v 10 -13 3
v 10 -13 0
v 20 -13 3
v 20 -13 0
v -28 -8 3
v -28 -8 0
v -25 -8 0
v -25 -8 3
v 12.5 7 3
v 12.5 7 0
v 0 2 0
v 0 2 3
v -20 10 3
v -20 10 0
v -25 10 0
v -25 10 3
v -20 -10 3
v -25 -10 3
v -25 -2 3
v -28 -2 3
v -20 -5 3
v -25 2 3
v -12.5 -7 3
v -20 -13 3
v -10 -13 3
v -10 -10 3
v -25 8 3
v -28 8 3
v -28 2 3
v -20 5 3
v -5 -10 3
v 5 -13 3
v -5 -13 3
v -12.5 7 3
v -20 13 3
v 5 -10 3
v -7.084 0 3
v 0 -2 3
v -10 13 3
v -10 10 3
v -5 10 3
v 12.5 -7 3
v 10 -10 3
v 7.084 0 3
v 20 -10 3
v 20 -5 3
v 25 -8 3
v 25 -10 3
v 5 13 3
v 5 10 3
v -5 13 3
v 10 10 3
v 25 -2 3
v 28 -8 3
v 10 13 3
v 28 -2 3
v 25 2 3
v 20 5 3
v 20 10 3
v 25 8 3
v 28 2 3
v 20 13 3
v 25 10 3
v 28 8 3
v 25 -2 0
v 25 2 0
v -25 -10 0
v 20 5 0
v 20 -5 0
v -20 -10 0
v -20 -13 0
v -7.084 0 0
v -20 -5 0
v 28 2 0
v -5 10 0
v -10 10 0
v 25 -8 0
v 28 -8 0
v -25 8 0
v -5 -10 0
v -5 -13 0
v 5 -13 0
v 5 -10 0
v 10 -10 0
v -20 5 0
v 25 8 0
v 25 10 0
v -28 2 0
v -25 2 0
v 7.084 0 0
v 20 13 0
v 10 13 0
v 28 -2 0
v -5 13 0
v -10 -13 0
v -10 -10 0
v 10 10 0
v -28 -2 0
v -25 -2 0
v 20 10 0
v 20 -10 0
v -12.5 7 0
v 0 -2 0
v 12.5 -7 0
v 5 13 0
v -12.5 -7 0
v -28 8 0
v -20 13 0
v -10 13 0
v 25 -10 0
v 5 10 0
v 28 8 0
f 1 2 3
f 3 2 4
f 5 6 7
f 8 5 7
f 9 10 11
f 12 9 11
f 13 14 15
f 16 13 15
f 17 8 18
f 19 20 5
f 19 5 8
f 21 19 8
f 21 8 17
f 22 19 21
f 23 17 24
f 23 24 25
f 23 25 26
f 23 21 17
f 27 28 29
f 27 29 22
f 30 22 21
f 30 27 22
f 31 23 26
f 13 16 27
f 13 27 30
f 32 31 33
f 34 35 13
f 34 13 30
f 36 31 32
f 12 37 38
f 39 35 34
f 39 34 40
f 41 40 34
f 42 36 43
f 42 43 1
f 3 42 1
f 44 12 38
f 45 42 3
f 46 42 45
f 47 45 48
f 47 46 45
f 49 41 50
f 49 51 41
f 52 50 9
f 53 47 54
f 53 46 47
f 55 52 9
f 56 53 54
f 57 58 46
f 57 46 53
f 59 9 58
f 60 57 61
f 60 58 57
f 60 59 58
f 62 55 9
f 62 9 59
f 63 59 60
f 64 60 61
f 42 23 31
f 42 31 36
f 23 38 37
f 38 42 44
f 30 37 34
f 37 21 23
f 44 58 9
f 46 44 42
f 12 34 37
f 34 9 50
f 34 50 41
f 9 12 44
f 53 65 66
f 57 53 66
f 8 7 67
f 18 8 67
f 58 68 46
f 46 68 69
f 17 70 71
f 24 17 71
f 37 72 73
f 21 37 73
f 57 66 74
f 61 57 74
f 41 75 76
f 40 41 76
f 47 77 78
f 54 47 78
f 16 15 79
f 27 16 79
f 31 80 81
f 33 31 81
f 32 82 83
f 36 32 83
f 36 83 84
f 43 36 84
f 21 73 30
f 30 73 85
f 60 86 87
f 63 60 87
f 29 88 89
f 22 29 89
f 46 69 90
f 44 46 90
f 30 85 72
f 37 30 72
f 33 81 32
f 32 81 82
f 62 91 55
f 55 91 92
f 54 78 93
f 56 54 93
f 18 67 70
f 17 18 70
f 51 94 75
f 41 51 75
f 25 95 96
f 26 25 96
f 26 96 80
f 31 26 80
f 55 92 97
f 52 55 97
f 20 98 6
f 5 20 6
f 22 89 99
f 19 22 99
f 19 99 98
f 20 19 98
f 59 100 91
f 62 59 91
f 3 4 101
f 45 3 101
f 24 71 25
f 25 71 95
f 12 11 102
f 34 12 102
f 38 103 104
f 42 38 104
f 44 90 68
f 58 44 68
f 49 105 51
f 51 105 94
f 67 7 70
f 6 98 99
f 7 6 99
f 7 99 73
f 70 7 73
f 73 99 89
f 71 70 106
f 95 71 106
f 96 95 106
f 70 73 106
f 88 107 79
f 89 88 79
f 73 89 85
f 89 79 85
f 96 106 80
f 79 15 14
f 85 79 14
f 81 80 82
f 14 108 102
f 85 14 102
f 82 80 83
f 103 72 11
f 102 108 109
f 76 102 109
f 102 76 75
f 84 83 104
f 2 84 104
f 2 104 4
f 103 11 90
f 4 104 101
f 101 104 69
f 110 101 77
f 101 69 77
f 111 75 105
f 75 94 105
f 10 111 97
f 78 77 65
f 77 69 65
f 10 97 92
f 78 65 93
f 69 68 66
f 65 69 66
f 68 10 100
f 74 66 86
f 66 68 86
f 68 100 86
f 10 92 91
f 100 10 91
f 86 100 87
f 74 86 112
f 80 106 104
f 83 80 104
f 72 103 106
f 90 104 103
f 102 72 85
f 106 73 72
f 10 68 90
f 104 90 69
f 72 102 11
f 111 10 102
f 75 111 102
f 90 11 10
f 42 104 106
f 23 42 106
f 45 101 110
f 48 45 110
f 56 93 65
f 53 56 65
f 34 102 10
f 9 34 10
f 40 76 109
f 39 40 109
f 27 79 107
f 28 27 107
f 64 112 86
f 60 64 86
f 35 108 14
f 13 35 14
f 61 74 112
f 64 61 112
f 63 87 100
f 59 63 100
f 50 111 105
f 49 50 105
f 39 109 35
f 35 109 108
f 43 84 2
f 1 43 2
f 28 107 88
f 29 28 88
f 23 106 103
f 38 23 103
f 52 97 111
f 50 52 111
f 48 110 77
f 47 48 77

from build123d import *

# Parameters (mm, degrees)
EXTRUDE_1_DEPTH = 3


with BuildPart() as part:
    # 草图1 → 凸台-拉伸1 (new body)
    with BuildSketch(Plane.XY):
        Polygon((-25, -10), (-20, -10), (-20, -13), (-10, -13), (-10, -10), (-5, -10), (-5, -13), (5, -13), (5, -10), (10, -10), (10, -13), (20, -13), (20, -10), (25, -10), (25, -8), (28, -8), (28, -2), (25, -2), (25, 2), (28, 2), (28, 8), (25, 8), (25, 10), (20, 10), (20, 13), (10, 13), (10, 10), (5, 10), (5, 13), (-5, 13), (-5, 10), (-10, 10), (-10, 13), (-20, 13), (-20, 10), (-25, 10), (-25, 8), (-28, 8), (-28, 2), (-25, 2), (-25, -2), (-28, -2), (-28, -8), (-25, -8), align=None)
        Polygon((-12.5, 7), (12.5, 7), (0, 2), align=None, mode=Mode.SUBTRACT)
        Polygon((20, 5), (20, -5), (7.08425002, 0), align=None, mode=Mode.SUBTRACT)
        Polygon((-20, 5), (-7.08425002, 0), (-20, -5), align=None, mode=Mode.SUBTRACT)
        Polygon((-12.5, -7), (0, -2), (12.5, -7), align=None, mode=Mode.SUBTRACT)
    extrude(amount=EXTRUDE_1_DEPTH)


solid = part.part
